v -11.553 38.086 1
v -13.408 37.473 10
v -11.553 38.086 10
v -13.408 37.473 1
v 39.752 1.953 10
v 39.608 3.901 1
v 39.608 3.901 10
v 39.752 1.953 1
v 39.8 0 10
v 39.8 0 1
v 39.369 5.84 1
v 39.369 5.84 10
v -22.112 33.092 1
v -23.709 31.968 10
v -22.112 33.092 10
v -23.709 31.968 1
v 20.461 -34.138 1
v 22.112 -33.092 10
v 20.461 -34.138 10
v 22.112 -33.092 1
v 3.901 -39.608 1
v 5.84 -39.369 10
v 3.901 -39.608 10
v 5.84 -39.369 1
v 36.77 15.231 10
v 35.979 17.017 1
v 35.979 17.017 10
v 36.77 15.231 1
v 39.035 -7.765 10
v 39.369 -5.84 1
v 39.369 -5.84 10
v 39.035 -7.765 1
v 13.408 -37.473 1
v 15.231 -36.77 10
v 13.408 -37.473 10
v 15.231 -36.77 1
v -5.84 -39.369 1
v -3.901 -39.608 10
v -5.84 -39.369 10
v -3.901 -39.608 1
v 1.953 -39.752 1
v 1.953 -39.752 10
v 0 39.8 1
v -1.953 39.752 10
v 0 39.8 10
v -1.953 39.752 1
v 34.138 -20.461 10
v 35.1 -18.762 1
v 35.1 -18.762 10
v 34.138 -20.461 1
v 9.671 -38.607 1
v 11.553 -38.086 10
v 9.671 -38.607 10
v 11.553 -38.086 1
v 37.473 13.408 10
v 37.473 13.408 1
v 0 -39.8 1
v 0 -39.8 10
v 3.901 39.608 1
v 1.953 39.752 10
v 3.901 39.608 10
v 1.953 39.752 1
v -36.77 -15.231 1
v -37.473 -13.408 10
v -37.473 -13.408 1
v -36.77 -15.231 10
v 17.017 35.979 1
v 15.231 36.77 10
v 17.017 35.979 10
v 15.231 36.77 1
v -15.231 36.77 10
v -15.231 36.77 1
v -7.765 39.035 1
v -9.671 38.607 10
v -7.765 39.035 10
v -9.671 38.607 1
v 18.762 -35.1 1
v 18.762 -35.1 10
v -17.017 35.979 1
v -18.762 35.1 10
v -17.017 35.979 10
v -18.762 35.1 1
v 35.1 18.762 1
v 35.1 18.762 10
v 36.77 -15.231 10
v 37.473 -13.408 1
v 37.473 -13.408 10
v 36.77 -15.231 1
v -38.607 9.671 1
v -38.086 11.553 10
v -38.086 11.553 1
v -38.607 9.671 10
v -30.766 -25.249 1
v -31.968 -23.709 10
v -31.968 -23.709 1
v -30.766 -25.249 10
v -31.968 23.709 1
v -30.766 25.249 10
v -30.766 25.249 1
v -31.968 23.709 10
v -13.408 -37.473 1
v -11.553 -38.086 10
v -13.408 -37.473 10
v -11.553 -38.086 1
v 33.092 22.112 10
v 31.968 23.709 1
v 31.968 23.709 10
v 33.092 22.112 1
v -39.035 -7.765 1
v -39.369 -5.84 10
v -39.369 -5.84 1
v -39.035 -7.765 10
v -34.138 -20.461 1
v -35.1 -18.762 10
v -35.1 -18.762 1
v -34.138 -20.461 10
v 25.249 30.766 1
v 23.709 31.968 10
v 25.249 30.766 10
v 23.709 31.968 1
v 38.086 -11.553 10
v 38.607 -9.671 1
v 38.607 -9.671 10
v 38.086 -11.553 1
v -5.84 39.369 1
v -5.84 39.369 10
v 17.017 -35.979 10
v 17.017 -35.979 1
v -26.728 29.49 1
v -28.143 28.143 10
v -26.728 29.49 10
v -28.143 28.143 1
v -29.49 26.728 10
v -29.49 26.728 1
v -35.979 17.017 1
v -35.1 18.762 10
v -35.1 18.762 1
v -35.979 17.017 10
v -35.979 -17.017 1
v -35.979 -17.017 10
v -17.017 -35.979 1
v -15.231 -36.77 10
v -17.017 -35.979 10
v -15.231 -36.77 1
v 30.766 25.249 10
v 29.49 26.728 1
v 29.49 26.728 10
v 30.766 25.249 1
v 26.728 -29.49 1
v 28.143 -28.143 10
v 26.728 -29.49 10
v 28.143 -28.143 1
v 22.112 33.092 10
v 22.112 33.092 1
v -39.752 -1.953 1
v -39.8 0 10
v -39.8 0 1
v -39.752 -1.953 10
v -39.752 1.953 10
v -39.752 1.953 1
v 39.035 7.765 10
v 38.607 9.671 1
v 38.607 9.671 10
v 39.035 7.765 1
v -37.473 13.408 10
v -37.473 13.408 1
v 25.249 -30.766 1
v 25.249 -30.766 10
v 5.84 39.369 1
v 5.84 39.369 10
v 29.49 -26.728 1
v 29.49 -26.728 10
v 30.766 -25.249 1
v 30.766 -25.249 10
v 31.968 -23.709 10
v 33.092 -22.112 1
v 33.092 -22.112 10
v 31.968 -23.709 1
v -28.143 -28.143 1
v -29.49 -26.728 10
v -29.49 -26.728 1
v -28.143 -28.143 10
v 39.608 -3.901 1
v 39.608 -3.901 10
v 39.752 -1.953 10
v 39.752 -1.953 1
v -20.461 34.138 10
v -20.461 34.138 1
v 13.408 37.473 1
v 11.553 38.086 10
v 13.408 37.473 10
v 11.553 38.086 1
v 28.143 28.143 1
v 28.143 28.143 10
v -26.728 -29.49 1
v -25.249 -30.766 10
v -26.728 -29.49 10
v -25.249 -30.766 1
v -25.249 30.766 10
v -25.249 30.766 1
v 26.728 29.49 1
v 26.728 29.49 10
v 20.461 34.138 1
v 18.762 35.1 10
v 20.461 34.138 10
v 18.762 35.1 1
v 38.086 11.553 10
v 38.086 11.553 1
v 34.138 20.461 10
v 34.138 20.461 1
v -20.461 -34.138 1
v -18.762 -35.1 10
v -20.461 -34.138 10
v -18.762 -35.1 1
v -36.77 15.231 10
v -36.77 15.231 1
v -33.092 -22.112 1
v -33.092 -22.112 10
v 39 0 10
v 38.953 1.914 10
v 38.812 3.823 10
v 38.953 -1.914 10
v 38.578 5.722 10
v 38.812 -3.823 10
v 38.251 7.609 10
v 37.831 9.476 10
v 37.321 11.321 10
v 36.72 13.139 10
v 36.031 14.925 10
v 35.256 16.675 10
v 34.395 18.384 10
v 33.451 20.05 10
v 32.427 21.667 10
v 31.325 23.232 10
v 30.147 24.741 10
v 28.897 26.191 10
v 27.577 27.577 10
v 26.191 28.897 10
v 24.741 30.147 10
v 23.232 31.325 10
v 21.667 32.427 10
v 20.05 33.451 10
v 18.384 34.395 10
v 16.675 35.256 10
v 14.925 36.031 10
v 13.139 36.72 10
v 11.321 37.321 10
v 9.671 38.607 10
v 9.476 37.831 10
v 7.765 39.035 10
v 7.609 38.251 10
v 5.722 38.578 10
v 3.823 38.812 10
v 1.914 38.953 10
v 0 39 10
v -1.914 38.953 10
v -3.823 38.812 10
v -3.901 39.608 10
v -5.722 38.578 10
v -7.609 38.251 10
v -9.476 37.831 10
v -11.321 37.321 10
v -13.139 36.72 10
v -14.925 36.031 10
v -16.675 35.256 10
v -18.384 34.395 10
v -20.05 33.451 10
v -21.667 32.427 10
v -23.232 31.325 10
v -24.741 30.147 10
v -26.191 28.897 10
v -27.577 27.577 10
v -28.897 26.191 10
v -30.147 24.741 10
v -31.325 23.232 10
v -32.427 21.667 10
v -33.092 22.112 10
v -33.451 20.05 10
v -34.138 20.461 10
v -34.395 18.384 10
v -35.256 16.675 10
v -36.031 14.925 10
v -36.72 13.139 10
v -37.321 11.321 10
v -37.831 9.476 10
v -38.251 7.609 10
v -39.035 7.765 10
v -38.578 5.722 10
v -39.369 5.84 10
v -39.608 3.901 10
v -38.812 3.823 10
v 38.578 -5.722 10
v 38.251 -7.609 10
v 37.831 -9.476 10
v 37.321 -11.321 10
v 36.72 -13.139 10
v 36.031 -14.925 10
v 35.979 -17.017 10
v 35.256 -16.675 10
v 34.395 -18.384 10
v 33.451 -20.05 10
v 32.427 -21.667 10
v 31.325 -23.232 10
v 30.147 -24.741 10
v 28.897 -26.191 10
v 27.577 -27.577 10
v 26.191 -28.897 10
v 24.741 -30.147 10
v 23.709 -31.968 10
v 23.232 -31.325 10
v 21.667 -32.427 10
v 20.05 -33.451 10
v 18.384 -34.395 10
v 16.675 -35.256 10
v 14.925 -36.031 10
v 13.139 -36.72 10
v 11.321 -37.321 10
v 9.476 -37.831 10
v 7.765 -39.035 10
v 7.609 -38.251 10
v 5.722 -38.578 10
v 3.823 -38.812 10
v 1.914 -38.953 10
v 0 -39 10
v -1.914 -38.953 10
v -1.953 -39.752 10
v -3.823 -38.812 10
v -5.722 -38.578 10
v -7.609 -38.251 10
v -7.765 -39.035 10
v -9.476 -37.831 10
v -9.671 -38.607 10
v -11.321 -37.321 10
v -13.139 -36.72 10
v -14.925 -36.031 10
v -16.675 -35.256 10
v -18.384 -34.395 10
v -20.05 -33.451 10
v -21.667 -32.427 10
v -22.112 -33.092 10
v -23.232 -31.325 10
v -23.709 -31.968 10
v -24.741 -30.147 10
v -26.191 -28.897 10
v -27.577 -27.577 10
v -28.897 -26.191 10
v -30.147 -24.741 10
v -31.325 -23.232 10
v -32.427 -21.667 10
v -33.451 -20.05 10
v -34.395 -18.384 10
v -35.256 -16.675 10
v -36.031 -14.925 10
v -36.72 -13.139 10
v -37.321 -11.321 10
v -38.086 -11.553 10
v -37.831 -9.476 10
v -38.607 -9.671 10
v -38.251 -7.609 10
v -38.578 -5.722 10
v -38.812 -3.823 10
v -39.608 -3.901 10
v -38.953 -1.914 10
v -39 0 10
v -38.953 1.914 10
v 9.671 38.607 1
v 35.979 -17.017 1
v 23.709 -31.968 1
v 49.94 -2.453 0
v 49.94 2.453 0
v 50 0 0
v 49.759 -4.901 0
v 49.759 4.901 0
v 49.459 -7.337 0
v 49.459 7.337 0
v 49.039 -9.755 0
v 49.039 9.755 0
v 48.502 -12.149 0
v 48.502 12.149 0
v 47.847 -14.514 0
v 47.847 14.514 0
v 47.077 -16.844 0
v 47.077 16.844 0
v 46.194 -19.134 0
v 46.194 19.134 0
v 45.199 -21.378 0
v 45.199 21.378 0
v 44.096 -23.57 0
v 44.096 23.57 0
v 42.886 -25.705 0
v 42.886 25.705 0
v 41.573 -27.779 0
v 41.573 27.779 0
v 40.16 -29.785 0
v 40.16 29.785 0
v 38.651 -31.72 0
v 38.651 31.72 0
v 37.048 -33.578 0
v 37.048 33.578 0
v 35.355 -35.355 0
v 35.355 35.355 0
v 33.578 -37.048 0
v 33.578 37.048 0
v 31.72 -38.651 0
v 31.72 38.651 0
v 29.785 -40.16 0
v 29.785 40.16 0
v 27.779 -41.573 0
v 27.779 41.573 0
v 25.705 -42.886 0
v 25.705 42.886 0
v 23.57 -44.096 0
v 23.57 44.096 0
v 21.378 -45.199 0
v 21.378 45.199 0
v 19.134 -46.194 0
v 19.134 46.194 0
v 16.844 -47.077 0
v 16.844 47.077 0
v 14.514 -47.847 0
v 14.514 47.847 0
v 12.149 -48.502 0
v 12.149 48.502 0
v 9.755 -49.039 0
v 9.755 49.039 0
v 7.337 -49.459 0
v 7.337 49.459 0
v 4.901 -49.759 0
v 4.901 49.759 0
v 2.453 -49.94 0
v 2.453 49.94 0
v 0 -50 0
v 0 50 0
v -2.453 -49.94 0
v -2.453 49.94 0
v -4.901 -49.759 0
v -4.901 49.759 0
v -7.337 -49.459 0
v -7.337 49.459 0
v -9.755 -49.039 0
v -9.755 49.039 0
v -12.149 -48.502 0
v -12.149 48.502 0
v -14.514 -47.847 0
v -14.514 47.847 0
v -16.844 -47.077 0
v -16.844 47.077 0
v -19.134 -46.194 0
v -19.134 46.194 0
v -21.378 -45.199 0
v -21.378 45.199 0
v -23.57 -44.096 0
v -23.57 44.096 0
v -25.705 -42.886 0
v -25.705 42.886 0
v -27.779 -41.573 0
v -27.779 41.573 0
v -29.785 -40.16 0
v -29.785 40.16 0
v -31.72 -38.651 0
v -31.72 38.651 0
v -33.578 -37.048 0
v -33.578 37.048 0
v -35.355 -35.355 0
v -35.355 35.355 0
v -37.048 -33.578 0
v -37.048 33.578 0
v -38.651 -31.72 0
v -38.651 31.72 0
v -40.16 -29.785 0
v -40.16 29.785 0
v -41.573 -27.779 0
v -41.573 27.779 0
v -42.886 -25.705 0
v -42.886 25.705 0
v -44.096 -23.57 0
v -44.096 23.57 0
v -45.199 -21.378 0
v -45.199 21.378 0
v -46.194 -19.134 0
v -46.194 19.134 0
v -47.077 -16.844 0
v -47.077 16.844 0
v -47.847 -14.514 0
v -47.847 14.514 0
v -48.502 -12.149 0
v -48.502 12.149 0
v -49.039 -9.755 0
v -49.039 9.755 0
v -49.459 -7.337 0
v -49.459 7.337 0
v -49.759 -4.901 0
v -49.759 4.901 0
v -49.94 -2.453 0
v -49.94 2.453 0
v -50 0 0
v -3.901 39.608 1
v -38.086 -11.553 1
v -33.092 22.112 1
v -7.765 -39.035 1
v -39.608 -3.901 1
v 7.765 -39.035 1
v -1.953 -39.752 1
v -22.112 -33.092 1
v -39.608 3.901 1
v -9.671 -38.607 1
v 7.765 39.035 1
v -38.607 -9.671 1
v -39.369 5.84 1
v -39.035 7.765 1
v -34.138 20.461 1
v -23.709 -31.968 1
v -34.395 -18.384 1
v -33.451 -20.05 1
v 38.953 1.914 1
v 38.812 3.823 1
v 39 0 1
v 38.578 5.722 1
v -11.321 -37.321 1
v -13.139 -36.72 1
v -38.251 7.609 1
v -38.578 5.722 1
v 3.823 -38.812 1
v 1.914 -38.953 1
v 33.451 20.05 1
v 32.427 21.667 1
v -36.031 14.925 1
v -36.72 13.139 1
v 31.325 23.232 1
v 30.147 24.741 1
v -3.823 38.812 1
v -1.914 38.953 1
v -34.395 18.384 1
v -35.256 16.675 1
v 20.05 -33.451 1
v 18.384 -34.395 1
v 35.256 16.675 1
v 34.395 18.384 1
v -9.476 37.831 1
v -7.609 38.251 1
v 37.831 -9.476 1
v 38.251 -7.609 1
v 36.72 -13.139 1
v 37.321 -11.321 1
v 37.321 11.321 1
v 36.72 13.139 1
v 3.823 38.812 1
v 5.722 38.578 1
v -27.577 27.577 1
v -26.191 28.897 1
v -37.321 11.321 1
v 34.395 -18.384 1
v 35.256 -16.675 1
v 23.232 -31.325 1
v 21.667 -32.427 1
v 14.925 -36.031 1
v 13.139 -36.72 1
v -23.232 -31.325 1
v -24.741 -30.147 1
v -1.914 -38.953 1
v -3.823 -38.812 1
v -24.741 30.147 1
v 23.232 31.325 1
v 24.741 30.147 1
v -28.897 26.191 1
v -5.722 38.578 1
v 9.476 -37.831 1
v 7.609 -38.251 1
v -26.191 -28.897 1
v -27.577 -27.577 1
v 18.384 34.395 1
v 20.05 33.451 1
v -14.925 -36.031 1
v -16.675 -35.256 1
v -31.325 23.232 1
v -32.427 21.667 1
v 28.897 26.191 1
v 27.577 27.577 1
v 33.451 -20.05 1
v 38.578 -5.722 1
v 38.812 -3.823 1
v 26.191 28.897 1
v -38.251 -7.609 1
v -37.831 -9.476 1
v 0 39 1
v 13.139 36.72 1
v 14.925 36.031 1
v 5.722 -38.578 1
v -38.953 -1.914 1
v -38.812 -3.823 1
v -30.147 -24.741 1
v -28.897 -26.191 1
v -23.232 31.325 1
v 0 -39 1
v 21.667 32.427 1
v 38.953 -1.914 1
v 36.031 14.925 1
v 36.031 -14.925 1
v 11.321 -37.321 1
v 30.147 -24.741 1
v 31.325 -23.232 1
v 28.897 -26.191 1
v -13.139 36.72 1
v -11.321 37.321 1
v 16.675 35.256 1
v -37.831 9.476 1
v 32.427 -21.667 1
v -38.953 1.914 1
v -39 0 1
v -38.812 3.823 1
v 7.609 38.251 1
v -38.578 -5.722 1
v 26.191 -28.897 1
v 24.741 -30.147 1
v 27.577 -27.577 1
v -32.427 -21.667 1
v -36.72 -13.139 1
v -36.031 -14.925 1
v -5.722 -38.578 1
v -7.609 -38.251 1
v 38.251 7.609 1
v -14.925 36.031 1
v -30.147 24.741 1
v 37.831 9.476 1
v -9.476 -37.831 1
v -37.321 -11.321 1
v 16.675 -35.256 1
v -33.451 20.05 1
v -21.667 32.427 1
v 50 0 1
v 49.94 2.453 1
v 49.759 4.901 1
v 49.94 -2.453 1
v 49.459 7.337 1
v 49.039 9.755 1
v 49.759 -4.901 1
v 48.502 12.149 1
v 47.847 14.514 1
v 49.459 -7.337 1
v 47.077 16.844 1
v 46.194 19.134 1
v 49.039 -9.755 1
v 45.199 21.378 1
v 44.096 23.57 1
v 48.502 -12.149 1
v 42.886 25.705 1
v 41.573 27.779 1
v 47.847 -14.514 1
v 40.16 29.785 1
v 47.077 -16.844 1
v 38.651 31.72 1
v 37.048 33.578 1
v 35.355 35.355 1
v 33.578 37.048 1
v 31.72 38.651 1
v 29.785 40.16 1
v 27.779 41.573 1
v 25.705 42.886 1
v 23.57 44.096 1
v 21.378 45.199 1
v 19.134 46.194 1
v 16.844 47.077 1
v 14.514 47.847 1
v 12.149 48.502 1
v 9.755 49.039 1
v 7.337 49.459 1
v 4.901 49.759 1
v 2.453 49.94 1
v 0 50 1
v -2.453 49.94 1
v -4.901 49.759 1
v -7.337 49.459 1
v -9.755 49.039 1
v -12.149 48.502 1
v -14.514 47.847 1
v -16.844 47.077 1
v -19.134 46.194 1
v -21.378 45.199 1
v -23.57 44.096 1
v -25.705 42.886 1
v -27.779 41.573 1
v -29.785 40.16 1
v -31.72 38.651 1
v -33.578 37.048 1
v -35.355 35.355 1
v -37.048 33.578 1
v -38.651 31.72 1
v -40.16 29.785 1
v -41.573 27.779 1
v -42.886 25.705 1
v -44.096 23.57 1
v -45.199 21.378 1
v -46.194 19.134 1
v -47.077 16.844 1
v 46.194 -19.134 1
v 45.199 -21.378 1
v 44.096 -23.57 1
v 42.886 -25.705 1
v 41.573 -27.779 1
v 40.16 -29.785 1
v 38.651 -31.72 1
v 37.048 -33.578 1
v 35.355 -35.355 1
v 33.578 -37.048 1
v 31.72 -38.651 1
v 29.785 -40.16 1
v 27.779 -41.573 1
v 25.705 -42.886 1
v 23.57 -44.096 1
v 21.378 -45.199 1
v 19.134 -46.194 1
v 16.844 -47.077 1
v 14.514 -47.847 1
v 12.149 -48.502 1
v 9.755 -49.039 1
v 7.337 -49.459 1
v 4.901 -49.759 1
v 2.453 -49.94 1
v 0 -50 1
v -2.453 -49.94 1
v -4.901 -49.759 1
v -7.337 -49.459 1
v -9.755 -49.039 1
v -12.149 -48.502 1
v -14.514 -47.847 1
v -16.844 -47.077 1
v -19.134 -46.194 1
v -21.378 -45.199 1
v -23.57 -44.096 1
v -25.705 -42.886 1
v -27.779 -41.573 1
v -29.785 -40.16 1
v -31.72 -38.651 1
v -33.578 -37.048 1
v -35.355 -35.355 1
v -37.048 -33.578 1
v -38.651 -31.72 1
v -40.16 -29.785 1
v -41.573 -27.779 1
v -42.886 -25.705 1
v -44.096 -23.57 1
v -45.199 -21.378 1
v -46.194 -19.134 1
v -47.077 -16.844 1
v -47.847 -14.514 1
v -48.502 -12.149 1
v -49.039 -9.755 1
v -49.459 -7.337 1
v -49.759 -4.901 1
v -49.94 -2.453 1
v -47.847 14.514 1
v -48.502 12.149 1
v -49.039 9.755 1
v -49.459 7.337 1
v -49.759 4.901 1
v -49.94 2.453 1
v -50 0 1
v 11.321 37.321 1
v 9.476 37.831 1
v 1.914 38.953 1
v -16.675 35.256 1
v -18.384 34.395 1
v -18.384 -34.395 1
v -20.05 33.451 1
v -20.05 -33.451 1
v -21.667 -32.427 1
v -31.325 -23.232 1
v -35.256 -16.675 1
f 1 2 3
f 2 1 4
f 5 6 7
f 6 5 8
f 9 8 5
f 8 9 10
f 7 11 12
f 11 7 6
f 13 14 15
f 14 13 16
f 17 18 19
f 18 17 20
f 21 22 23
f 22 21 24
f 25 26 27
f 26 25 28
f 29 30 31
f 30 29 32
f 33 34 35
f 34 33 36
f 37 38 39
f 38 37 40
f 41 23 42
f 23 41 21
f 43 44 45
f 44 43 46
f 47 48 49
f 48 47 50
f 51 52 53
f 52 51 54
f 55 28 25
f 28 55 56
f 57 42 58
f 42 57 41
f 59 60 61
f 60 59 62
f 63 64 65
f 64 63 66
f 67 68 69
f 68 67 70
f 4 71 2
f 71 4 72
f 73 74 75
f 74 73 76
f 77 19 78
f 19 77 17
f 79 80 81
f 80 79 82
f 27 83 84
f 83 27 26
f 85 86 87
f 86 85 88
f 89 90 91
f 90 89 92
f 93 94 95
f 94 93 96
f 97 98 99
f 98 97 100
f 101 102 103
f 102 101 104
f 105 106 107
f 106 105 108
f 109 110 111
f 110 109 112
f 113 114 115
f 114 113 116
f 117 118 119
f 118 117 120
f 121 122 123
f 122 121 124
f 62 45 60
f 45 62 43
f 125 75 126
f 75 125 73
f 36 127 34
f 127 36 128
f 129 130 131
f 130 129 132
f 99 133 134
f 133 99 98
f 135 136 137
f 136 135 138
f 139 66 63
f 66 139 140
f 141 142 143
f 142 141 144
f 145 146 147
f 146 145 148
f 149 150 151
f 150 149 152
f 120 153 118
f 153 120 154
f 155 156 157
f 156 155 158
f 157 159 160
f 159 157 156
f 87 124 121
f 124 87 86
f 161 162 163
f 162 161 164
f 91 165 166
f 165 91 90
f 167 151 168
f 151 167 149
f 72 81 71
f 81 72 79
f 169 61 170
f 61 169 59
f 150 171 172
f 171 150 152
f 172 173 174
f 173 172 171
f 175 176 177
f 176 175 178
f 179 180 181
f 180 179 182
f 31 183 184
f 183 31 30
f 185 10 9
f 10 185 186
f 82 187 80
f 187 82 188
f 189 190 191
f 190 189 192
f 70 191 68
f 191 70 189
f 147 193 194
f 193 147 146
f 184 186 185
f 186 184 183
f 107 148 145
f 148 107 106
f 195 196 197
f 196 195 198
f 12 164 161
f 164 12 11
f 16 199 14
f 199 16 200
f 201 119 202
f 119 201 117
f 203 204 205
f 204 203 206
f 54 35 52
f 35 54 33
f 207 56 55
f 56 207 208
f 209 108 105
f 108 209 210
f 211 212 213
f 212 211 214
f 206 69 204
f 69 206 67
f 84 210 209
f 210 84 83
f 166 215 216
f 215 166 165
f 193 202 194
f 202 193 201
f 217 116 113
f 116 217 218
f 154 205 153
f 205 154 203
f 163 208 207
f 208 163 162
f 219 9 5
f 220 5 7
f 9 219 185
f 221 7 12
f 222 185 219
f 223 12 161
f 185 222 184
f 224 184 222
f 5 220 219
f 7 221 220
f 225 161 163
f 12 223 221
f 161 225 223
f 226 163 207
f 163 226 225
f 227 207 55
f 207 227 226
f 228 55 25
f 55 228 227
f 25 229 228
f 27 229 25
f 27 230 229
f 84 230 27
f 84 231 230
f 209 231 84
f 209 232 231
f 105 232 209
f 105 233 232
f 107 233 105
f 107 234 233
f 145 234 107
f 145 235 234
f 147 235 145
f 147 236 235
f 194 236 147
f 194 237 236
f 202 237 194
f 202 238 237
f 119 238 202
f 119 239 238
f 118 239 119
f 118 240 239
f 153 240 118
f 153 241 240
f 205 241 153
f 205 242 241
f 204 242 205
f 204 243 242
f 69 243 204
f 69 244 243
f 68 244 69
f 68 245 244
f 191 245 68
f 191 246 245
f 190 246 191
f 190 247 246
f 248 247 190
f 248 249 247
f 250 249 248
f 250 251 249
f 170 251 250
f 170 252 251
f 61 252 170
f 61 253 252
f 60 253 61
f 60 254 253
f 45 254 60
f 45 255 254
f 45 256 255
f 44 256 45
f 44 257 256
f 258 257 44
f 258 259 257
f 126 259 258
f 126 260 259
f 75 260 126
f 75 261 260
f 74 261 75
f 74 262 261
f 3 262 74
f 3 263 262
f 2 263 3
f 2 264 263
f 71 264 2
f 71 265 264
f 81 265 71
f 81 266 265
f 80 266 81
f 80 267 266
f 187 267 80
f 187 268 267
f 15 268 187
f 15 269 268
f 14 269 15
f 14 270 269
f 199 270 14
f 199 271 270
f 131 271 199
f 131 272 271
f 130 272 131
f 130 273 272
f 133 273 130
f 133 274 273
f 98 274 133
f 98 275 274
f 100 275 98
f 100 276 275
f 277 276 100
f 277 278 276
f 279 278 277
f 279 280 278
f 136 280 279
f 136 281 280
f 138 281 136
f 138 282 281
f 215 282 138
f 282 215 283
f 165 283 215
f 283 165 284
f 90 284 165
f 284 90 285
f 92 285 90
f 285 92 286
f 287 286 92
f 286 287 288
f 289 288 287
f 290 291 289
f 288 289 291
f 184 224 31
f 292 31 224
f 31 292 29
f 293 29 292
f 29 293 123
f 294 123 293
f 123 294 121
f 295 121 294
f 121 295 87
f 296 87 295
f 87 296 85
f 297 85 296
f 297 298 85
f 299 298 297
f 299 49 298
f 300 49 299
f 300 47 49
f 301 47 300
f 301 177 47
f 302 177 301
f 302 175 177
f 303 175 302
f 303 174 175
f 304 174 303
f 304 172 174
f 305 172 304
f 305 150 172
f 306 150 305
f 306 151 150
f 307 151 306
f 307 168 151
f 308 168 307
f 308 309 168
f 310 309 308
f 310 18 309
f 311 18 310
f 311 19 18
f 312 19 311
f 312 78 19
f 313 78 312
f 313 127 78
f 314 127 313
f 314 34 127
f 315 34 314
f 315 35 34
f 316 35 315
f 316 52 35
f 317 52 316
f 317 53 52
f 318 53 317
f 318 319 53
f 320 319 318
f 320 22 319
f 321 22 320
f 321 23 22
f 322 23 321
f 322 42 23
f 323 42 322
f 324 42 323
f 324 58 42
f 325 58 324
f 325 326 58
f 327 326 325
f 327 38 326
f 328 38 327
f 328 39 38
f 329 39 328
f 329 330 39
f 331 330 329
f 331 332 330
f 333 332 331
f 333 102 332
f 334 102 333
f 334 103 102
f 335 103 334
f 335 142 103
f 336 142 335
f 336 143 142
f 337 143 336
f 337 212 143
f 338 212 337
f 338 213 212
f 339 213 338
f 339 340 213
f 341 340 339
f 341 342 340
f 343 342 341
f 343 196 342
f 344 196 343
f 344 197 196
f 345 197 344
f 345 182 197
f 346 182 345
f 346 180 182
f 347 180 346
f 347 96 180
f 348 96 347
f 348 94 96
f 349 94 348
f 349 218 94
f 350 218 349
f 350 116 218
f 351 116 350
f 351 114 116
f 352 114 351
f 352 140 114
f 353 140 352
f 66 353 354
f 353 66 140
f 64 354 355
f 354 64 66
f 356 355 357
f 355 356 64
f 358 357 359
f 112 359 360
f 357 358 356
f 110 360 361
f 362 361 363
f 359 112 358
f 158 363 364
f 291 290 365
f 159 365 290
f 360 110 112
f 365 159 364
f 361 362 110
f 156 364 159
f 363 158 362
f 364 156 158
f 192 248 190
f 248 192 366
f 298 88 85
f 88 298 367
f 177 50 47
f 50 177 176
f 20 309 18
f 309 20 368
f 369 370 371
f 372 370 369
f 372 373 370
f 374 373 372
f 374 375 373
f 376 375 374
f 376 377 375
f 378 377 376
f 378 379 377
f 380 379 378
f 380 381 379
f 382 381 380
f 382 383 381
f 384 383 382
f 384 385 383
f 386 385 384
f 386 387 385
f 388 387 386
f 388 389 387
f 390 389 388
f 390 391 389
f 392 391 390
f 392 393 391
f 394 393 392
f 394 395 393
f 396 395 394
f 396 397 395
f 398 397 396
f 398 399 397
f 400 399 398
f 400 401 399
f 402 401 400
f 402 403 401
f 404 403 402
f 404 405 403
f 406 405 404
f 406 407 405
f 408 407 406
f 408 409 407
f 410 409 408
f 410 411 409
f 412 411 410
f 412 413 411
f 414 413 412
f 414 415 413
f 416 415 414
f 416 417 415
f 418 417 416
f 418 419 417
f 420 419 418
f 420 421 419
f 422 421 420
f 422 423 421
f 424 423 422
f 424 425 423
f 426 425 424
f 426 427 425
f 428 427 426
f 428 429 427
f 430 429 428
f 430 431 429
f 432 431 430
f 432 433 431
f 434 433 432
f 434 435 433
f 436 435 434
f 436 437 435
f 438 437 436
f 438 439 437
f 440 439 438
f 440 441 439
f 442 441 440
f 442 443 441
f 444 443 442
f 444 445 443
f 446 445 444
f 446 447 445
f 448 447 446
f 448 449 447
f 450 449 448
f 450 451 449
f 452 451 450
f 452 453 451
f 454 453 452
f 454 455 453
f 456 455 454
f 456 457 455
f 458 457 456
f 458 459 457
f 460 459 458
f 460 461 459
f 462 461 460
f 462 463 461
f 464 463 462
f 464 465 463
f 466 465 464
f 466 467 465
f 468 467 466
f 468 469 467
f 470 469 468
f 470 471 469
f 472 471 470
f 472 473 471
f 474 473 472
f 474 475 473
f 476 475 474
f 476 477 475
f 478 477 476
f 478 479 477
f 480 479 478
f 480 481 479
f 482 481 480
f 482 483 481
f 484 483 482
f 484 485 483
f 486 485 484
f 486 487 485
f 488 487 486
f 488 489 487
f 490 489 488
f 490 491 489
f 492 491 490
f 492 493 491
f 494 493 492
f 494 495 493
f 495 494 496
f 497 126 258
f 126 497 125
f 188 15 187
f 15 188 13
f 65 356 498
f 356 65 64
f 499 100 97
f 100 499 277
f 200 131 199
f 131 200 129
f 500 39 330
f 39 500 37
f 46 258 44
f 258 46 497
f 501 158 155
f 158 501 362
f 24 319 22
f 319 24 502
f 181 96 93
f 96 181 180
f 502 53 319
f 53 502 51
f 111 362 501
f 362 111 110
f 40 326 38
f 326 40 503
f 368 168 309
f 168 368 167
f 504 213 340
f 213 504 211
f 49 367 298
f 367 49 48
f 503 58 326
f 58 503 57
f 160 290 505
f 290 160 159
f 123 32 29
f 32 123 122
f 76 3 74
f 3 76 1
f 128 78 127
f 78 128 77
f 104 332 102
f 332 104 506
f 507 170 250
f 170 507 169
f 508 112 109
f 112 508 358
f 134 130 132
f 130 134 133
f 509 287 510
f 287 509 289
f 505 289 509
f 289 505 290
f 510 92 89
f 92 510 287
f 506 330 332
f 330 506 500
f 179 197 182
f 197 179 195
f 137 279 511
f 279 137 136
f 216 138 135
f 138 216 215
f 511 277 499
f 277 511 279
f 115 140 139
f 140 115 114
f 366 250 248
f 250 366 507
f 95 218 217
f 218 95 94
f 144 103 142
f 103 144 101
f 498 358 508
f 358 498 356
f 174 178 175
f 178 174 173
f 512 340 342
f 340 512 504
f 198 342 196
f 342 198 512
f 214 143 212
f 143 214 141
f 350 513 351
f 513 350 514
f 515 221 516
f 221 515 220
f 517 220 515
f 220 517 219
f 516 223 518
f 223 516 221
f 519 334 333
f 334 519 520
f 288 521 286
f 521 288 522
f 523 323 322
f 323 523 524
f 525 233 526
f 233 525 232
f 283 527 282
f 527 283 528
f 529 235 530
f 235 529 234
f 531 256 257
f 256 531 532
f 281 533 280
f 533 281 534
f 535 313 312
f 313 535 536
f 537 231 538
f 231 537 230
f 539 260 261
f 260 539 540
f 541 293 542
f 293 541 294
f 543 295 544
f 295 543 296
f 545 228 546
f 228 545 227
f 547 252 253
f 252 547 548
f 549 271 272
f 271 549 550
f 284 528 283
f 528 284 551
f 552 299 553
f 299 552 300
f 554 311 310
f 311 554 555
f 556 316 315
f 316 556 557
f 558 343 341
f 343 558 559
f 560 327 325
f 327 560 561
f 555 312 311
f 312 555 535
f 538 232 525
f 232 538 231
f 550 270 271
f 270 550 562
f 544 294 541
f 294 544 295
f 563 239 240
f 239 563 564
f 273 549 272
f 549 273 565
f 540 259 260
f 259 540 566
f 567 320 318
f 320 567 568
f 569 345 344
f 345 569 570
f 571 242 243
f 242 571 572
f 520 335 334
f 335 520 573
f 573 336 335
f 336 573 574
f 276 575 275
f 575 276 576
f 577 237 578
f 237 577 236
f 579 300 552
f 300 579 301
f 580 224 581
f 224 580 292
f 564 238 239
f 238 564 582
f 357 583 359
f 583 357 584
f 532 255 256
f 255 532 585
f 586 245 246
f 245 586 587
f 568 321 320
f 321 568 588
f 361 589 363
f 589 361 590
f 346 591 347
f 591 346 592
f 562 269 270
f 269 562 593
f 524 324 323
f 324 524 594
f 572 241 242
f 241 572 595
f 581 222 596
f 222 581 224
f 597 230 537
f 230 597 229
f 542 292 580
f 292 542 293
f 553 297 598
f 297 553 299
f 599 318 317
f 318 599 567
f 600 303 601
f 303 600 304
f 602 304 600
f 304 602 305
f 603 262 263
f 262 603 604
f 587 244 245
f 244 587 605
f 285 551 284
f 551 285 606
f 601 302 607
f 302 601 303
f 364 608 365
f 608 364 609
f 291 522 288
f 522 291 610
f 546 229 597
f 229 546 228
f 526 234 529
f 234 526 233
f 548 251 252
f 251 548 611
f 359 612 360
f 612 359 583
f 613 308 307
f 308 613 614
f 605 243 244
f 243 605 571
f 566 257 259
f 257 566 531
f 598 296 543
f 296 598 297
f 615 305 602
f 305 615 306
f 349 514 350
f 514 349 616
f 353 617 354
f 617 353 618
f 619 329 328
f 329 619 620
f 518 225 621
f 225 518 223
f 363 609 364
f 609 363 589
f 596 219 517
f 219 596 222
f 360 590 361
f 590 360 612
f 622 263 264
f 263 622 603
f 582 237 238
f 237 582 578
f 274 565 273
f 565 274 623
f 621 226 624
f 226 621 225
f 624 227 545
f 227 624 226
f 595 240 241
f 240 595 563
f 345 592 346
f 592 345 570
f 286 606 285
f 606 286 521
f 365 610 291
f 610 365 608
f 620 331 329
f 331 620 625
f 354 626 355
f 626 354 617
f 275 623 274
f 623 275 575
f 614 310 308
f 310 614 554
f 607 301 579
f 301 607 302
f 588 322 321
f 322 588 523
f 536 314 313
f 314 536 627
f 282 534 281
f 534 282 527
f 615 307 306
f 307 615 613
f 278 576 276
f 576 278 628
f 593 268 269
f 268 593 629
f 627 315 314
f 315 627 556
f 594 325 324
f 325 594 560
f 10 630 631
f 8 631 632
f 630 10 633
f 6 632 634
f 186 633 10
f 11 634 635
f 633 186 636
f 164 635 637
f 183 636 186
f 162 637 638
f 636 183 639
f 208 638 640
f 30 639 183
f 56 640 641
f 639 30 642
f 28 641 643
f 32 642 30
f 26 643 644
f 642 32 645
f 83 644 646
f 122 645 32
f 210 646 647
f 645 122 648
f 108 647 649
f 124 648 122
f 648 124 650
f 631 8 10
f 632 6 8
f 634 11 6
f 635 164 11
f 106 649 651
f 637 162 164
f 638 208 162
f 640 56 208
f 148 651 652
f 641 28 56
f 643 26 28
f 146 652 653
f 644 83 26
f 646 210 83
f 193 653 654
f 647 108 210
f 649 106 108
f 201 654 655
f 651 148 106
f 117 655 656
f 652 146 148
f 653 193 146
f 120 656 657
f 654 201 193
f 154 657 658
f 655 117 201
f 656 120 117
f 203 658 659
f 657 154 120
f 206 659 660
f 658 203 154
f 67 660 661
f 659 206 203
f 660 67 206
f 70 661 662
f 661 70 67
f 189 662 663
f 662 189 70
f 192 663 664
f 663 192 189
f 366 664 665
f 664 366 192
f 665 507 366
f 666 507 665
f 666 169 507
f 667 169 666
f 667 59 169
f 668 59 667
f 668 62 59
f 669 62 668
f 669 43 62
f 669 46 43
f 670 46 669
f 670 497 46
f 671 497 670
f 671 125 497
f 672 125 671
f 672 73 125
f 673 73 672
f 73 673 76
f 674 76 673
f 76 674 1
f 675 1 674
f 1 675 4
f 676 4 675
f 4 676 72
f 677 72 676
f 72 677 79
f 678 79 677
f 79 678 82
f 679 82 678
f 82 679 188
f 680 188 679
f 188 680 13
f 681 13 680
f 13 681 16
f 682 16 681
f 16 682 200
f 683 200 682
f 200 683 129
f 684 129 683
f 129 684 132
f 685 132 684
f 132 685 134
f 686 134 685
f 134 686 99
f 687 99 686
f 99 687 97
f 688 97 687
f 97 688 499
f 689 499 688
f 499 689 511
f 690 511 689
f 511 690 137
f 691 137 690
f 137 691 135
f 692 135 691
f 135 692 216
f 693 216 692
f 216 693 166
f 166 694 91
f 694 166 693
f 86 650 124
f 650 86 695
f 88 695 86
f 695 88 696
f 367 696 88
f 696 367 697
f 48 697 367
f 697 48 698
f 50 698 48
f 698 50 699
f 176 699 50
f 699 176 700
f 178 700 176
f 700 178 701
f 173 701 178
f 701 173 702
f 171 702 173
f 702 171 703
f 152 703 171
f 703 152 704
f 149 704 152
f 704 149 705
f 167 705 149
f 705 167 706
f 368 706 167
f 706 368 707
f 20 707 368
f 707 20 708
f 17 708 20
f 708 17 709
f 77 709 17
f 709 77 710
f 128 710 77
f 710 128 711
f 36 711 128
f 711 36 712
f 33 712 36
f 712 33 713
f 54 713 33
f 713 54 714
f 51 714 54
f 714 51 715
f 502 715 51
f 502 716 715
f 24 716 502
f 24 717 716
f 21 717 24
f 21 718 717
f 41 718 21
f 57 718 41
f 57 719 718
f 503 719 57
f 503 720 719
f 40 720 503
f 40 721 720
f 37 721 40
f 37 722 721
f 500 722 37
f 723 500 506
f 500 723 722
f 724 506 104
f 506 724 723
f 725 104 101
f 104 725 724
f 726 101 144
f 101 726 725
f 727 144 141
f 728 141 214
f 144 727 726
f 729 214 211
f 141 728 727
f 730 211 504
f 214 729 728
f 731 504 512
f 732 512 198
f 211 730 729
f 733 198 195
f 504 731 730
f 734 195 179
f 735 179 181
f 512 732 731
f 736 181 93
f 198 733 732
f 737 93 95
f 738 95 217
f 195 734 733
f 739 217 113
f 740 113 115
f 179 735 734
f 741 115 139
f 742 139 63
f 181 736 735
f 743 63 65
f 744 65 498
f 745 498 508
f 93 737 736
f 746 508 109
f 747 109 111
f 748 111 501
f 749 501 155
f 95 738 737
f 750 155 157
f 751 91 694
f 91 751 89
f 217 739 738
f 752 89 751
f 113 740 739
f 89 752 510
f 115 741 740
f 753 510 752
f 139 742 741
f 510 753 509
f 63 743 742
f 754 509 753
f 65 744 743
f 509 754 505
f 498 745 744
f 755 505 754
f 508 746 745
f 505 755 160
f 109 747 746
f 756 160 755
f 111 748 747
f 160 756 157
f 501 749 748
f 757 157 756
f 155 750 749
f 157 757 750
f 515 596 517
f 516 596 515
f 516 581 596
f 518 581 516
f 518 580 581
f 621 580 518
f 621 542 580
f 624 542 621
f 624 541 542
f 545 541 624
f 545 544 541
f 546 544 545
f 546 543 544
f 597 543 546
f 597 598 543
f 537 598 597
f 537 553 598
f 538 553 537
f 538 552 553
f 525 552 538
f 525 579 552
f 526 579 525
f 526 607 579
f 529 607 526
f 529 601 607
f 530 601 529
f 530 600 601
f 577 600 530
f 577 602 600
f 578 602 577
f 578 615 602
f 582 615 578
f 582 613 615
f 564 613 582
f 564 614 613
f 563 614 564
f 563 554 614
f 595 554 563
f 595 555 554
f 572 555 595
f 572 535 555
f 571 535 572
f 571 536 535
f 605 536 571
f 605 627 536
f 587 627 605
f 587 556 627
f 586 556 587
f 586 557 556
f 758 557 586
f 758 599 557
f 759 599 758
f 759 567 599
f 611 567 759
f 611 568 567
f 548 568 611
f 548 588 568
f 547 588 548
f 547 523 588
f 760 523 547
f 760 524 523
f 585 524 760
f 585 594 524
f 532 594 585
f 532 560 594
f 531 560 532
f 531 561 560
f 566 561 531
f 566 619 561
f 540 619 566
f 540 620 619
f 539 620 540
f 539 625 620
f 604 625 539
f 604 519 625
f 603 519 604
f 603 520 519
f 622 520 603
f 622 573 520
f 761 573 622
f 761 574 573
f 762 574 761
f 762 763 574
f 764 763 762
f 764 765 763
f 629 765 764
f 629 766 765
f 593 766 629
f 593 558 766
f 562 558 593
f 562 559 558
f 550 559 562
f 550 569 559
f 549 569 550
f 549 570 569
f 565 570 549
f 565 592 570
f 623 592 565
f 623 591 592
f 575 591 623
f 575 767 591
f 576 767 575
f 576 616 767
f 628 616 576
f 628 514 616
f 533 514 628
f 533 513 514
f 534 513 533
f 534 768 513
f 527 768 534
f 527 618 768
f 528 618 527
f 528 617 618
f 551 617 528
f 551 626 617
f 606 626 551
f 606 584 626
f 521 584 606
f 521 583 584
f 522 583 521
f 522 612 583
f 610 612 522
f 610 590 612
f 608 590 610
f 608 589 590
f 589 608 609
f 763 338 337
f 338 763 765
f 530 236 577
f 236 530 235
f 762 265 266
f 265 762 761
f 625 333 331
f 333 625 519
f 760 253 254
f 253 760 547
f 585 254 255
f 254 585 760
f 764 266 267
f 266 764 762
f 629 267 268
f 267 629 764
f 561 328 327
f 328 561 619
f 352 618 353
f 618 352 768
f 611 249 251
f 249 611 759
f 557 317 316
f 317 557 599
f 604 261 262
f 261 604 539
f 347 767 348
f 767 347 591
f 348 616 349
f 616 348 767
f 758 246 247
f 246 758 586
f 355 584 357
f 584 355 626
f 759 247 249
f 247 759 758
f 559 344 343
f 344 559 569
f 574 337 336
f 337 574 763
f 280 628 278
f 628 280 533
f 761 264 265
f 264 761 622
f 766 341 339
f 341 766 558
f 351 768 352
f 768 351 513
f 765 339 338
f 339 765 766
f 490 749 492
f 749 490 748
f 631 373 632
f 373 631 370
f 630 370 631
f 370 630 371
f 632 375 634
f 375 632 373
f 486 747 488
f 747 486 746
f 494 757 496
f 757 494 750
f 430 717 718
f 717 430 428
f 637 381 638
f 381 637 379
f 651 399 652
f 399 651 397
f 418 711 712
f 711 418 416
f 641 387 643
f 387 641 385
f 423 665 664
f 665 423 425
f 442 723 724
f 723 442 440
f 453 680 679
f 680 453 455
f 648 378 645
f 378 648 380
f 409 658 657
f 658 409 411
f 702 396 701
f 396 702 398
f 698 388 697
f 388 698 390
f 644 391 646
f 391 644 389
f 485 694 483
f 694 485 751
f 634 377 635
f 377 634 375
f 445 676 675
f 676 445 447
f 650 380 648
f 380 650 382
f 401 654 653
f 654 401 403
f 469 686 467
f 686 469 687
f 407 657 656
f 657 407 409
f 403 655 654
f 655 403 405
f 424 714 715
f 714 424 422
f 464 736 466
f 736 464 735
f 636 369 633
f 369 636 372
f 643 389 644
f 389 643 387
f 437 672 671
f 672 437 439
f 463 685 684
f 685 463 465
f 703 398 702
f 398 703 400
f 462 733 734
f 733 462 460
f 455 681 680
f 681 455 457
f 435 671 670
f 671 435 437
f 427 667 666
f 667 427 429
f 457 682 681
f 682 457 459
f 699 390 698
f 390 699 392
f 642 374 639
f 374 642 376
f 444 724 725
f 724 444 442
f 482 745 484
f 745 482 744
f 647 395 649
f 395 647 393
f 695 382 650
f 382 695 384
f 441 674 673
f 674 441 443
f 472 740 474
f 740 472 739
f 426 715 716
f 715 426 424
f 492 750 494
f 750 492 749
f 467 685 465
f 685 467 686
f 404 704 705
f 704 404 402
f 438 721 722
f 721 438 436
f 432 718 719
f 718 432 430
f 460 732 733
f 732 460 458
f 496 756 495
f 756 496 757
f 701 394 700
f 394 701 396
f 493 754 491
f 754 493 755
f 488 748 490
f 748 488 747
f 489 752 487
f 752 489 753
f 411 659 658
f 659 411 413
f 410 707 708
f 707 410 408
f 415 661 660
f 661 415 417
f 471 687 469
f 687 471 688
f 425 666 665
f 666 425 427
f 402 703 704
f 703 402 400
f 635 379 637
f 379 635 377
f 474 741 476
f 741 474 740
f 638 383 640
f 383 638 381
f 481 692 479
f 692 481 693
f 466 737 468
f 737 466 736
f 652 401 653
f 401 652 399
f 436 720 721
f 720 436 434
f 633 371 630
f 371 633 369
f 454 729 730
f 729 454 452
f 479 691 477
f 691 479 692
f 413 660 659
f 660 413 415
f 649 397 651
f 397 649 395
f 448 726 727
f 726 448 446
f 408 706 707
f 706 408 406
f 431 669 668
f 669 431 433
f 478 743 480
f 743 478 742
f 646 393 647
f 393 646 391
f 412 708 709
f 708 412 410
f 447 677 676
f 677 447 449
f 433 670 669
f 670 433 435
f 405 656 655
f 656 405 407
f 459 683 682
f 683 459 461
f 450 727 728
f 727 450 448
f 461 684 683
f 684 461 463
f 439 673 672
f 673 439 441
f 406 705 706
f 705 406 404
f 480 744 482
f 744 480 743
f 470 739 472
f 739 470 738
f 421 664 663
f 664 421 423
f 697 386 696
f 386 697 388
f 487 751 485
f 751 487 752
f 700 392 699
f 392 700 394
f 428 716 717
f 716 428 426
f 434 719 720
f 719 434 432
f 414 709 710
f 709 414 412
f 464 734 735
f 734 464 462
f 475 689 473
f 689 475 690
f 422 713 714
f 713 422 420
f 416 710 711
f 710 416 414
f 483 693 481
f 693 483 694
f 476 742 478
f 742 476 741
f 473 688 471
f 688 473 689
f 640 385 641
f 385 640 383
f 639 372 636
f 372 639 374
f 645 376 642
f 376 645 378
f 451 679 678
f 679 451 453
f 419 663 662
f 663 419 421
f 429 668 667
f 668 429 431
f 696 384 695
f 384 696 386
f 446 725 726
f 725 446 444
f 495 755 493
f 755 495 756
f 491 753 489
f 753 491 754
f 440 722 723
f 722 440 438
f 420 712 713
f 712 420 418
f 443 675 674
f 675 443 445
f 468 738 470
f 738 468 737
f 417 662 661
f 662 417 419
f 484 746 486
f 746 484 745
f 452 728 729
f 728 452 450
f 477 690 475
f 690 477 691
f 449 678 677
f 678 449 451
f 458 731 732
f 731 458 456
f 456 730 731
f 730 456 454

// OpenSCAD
fn = 128;
// fn = 16;

margin = 10;
thickness = 1.0;
shim = 0.2;
spool_radius = 80.0 / 2.0;
spool_height = 10;

module render() {
  union() {
  cylinder(thickness,
           spool_radius+margin,
           spool_radius+margin, $fn=fn);
    difference() {
      cylinder(spool_height,
               spool_radius - shim,
               spool_radius - shim, $fn=fn);
      translate([0, 0, thickness])
      cylinder(spool_height,
               spool_radius-thickness,
               spool_radius-thickness, $fn=fn);
    }
  }
}

echo(version=version());


render();
